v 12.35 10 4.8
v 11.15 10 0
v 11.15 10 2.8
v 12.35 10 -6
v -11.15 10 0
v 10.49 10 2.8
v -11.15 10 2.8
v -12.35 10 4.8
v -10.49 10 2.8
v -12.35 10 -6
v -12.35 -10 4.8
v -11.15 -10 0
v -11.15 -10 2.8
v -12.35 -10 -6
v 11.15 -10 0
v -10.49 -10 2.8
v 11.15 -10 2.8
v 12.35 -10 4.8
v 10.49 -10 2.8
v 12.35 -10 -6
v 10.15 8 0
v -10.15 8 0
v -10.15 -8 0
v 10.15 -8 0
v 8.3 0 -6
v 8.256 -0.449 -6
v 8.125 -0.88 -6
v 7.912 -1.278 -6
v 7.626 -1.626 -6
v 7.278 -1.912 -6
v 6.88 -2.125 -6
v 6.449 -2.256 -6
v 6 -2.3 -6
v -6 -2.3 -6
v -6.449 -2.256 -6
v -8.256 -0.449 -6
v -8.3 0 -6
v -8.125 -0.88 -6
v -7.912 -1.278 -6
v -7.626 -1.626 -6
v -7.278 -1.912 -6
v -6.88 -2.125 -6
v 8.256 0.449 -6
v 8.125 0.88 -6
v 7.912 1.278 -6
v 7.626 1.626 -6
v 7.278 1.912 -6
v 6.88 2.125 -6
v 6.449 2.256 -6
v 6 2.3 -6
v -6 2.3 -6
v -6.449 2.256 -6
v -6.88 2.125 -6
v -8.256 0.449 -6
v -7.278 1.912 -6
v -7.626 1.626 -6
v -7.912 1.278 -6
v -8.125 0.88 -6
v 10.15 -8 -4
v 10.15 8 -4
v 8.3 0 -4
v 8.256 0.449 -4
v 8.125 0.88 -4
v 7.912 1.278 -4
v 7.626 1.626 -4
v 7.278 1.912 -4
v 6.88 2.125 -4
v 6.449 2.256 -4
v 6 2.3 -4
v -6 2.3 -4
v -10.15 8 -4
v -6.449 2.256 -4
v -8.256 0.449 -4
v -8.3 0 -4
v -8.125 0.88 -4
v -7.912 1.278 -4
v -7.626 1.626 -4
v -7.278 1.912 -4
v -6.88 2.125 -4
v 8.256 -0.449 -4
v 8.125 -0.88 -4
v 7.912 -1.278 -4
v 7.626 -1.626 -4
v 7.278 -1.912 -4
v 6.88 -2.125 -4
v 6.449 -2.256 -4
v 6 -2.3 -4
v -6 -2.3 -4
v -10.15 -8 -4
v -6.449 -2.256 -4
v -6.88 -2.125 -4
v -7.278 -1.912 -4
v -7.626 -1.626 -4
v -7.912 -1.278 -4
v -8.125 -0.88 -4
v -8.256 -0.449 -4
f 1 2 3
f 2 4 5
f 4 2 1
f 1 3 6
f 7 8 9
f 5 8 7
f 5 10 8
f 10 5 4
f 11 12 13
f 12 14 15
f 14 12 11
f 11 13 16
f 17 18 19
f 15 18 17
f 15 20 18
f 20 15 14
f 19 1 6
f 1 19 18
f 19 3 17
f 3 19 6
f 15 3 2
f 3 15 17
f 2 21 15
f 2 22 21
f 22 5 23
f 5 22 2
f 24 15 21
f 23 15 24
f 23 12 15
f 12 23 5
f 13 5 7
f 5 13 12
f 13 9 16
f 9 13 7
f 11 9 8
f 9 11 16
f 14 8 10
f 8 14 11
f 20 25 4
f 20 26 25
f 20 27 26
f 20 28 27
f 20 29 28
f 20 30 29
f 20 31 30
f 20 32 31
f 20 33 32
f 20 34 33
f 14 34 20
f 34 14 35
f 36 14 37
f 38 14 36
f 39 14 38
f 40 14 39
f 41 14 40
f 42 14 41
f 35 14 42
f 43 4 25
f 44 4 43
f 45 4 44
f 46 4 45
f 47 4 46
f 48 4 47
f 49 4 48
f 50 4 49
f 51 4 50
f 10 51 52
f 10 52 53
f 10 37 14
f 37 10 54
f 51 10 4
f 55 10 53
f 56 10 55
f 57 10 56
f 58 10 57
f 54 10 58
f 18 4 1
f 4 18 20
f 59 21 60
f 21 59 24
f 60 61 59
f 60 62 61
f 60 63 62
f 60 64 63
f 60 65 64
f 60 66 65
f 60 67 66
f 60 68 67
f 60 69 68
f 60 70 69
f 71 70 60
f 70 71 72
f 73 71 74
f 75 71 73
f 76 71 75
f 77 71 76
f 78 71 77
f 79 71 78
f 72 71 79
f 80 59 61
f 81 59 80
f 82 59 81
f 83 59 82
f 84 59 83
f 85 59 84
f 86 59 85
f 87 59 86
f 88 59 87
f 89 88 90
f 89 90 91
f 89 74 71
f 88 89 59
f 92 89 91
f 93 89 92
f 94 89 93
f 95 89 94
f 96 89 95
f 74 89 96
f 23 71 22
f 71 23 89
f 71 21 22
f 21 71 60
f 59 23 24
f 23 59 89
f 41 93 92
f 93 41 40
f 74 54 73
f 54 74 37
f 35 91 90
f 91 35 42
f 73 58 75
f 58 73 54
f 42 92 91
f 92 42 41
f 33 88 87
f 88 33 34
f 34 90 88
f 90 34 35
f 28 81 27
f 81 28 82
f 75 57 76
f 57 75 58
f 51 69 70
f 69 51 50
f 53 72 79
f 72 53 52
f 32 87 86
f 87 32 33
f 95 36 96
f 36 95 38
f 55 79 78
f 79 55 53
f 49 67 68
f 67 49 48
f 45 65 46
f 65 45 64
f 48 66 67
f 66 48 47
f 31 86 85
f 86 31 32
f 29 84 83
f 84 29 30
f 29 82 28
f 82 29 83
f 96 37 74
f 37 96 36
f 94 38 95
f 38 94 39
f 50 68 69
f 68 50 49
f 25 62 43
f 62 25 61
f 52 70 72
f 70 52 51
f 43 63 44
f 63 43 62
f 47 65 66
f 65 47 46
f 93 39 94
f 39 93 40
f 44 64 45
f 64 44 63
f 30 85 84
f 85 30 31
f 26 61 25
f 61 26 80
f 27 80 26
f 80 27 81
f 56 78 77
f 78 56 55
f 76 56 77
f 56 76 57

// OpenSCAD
$fn=32;
width = 20;
channel_width = 22.3;
latch_height = 2;
overhang = 0.66;
wall_thickness = 2.8;
box_thickness = 6;
bottom_thickness = 2;
screw_hole_radius = 2.3;
screw_hole_width = 12;

outer_x = channel_width/2 + 1.2;

difference() {
  rotate([90,0,0])
  translate([0, 0, -width/2])
  linear_extrude(width)
  polygon([
    [-outer_x, -box_thickness],
    [-outer_x, wall_thickness + latch_height],
    [-channel_width/2 + overhang, wall_thickness],
    [-channel_width/2, wall_thickness],
    [-channel_width/2, 0],
    [channel_width/2, 0],
    [channel_width/2, wall_thickness],
    [channel_width/2 - overhang, wall_thickness],
    [outer_x, wall_thickness + latch_height],
    [outer_x, -box_thickness],
  ]);
    
  translate([0, 0, -box_thickness/2 + bottom_thickness])
  cube([channel_width - 2, width - 4, box_thickness], center=true);


  translate([0, 0, -box_thickness - 1])
  hull() {
    translate([screw_hole_width/2, 0, 0])
    cylinder(h=bottom_thickness+2, r=screw_hole_radius);
    translate([-screw_hole_width/2, 0, 0])
    cylinder(h=bottom_thickness+2, r=screw_hole_radius);
  }
}
